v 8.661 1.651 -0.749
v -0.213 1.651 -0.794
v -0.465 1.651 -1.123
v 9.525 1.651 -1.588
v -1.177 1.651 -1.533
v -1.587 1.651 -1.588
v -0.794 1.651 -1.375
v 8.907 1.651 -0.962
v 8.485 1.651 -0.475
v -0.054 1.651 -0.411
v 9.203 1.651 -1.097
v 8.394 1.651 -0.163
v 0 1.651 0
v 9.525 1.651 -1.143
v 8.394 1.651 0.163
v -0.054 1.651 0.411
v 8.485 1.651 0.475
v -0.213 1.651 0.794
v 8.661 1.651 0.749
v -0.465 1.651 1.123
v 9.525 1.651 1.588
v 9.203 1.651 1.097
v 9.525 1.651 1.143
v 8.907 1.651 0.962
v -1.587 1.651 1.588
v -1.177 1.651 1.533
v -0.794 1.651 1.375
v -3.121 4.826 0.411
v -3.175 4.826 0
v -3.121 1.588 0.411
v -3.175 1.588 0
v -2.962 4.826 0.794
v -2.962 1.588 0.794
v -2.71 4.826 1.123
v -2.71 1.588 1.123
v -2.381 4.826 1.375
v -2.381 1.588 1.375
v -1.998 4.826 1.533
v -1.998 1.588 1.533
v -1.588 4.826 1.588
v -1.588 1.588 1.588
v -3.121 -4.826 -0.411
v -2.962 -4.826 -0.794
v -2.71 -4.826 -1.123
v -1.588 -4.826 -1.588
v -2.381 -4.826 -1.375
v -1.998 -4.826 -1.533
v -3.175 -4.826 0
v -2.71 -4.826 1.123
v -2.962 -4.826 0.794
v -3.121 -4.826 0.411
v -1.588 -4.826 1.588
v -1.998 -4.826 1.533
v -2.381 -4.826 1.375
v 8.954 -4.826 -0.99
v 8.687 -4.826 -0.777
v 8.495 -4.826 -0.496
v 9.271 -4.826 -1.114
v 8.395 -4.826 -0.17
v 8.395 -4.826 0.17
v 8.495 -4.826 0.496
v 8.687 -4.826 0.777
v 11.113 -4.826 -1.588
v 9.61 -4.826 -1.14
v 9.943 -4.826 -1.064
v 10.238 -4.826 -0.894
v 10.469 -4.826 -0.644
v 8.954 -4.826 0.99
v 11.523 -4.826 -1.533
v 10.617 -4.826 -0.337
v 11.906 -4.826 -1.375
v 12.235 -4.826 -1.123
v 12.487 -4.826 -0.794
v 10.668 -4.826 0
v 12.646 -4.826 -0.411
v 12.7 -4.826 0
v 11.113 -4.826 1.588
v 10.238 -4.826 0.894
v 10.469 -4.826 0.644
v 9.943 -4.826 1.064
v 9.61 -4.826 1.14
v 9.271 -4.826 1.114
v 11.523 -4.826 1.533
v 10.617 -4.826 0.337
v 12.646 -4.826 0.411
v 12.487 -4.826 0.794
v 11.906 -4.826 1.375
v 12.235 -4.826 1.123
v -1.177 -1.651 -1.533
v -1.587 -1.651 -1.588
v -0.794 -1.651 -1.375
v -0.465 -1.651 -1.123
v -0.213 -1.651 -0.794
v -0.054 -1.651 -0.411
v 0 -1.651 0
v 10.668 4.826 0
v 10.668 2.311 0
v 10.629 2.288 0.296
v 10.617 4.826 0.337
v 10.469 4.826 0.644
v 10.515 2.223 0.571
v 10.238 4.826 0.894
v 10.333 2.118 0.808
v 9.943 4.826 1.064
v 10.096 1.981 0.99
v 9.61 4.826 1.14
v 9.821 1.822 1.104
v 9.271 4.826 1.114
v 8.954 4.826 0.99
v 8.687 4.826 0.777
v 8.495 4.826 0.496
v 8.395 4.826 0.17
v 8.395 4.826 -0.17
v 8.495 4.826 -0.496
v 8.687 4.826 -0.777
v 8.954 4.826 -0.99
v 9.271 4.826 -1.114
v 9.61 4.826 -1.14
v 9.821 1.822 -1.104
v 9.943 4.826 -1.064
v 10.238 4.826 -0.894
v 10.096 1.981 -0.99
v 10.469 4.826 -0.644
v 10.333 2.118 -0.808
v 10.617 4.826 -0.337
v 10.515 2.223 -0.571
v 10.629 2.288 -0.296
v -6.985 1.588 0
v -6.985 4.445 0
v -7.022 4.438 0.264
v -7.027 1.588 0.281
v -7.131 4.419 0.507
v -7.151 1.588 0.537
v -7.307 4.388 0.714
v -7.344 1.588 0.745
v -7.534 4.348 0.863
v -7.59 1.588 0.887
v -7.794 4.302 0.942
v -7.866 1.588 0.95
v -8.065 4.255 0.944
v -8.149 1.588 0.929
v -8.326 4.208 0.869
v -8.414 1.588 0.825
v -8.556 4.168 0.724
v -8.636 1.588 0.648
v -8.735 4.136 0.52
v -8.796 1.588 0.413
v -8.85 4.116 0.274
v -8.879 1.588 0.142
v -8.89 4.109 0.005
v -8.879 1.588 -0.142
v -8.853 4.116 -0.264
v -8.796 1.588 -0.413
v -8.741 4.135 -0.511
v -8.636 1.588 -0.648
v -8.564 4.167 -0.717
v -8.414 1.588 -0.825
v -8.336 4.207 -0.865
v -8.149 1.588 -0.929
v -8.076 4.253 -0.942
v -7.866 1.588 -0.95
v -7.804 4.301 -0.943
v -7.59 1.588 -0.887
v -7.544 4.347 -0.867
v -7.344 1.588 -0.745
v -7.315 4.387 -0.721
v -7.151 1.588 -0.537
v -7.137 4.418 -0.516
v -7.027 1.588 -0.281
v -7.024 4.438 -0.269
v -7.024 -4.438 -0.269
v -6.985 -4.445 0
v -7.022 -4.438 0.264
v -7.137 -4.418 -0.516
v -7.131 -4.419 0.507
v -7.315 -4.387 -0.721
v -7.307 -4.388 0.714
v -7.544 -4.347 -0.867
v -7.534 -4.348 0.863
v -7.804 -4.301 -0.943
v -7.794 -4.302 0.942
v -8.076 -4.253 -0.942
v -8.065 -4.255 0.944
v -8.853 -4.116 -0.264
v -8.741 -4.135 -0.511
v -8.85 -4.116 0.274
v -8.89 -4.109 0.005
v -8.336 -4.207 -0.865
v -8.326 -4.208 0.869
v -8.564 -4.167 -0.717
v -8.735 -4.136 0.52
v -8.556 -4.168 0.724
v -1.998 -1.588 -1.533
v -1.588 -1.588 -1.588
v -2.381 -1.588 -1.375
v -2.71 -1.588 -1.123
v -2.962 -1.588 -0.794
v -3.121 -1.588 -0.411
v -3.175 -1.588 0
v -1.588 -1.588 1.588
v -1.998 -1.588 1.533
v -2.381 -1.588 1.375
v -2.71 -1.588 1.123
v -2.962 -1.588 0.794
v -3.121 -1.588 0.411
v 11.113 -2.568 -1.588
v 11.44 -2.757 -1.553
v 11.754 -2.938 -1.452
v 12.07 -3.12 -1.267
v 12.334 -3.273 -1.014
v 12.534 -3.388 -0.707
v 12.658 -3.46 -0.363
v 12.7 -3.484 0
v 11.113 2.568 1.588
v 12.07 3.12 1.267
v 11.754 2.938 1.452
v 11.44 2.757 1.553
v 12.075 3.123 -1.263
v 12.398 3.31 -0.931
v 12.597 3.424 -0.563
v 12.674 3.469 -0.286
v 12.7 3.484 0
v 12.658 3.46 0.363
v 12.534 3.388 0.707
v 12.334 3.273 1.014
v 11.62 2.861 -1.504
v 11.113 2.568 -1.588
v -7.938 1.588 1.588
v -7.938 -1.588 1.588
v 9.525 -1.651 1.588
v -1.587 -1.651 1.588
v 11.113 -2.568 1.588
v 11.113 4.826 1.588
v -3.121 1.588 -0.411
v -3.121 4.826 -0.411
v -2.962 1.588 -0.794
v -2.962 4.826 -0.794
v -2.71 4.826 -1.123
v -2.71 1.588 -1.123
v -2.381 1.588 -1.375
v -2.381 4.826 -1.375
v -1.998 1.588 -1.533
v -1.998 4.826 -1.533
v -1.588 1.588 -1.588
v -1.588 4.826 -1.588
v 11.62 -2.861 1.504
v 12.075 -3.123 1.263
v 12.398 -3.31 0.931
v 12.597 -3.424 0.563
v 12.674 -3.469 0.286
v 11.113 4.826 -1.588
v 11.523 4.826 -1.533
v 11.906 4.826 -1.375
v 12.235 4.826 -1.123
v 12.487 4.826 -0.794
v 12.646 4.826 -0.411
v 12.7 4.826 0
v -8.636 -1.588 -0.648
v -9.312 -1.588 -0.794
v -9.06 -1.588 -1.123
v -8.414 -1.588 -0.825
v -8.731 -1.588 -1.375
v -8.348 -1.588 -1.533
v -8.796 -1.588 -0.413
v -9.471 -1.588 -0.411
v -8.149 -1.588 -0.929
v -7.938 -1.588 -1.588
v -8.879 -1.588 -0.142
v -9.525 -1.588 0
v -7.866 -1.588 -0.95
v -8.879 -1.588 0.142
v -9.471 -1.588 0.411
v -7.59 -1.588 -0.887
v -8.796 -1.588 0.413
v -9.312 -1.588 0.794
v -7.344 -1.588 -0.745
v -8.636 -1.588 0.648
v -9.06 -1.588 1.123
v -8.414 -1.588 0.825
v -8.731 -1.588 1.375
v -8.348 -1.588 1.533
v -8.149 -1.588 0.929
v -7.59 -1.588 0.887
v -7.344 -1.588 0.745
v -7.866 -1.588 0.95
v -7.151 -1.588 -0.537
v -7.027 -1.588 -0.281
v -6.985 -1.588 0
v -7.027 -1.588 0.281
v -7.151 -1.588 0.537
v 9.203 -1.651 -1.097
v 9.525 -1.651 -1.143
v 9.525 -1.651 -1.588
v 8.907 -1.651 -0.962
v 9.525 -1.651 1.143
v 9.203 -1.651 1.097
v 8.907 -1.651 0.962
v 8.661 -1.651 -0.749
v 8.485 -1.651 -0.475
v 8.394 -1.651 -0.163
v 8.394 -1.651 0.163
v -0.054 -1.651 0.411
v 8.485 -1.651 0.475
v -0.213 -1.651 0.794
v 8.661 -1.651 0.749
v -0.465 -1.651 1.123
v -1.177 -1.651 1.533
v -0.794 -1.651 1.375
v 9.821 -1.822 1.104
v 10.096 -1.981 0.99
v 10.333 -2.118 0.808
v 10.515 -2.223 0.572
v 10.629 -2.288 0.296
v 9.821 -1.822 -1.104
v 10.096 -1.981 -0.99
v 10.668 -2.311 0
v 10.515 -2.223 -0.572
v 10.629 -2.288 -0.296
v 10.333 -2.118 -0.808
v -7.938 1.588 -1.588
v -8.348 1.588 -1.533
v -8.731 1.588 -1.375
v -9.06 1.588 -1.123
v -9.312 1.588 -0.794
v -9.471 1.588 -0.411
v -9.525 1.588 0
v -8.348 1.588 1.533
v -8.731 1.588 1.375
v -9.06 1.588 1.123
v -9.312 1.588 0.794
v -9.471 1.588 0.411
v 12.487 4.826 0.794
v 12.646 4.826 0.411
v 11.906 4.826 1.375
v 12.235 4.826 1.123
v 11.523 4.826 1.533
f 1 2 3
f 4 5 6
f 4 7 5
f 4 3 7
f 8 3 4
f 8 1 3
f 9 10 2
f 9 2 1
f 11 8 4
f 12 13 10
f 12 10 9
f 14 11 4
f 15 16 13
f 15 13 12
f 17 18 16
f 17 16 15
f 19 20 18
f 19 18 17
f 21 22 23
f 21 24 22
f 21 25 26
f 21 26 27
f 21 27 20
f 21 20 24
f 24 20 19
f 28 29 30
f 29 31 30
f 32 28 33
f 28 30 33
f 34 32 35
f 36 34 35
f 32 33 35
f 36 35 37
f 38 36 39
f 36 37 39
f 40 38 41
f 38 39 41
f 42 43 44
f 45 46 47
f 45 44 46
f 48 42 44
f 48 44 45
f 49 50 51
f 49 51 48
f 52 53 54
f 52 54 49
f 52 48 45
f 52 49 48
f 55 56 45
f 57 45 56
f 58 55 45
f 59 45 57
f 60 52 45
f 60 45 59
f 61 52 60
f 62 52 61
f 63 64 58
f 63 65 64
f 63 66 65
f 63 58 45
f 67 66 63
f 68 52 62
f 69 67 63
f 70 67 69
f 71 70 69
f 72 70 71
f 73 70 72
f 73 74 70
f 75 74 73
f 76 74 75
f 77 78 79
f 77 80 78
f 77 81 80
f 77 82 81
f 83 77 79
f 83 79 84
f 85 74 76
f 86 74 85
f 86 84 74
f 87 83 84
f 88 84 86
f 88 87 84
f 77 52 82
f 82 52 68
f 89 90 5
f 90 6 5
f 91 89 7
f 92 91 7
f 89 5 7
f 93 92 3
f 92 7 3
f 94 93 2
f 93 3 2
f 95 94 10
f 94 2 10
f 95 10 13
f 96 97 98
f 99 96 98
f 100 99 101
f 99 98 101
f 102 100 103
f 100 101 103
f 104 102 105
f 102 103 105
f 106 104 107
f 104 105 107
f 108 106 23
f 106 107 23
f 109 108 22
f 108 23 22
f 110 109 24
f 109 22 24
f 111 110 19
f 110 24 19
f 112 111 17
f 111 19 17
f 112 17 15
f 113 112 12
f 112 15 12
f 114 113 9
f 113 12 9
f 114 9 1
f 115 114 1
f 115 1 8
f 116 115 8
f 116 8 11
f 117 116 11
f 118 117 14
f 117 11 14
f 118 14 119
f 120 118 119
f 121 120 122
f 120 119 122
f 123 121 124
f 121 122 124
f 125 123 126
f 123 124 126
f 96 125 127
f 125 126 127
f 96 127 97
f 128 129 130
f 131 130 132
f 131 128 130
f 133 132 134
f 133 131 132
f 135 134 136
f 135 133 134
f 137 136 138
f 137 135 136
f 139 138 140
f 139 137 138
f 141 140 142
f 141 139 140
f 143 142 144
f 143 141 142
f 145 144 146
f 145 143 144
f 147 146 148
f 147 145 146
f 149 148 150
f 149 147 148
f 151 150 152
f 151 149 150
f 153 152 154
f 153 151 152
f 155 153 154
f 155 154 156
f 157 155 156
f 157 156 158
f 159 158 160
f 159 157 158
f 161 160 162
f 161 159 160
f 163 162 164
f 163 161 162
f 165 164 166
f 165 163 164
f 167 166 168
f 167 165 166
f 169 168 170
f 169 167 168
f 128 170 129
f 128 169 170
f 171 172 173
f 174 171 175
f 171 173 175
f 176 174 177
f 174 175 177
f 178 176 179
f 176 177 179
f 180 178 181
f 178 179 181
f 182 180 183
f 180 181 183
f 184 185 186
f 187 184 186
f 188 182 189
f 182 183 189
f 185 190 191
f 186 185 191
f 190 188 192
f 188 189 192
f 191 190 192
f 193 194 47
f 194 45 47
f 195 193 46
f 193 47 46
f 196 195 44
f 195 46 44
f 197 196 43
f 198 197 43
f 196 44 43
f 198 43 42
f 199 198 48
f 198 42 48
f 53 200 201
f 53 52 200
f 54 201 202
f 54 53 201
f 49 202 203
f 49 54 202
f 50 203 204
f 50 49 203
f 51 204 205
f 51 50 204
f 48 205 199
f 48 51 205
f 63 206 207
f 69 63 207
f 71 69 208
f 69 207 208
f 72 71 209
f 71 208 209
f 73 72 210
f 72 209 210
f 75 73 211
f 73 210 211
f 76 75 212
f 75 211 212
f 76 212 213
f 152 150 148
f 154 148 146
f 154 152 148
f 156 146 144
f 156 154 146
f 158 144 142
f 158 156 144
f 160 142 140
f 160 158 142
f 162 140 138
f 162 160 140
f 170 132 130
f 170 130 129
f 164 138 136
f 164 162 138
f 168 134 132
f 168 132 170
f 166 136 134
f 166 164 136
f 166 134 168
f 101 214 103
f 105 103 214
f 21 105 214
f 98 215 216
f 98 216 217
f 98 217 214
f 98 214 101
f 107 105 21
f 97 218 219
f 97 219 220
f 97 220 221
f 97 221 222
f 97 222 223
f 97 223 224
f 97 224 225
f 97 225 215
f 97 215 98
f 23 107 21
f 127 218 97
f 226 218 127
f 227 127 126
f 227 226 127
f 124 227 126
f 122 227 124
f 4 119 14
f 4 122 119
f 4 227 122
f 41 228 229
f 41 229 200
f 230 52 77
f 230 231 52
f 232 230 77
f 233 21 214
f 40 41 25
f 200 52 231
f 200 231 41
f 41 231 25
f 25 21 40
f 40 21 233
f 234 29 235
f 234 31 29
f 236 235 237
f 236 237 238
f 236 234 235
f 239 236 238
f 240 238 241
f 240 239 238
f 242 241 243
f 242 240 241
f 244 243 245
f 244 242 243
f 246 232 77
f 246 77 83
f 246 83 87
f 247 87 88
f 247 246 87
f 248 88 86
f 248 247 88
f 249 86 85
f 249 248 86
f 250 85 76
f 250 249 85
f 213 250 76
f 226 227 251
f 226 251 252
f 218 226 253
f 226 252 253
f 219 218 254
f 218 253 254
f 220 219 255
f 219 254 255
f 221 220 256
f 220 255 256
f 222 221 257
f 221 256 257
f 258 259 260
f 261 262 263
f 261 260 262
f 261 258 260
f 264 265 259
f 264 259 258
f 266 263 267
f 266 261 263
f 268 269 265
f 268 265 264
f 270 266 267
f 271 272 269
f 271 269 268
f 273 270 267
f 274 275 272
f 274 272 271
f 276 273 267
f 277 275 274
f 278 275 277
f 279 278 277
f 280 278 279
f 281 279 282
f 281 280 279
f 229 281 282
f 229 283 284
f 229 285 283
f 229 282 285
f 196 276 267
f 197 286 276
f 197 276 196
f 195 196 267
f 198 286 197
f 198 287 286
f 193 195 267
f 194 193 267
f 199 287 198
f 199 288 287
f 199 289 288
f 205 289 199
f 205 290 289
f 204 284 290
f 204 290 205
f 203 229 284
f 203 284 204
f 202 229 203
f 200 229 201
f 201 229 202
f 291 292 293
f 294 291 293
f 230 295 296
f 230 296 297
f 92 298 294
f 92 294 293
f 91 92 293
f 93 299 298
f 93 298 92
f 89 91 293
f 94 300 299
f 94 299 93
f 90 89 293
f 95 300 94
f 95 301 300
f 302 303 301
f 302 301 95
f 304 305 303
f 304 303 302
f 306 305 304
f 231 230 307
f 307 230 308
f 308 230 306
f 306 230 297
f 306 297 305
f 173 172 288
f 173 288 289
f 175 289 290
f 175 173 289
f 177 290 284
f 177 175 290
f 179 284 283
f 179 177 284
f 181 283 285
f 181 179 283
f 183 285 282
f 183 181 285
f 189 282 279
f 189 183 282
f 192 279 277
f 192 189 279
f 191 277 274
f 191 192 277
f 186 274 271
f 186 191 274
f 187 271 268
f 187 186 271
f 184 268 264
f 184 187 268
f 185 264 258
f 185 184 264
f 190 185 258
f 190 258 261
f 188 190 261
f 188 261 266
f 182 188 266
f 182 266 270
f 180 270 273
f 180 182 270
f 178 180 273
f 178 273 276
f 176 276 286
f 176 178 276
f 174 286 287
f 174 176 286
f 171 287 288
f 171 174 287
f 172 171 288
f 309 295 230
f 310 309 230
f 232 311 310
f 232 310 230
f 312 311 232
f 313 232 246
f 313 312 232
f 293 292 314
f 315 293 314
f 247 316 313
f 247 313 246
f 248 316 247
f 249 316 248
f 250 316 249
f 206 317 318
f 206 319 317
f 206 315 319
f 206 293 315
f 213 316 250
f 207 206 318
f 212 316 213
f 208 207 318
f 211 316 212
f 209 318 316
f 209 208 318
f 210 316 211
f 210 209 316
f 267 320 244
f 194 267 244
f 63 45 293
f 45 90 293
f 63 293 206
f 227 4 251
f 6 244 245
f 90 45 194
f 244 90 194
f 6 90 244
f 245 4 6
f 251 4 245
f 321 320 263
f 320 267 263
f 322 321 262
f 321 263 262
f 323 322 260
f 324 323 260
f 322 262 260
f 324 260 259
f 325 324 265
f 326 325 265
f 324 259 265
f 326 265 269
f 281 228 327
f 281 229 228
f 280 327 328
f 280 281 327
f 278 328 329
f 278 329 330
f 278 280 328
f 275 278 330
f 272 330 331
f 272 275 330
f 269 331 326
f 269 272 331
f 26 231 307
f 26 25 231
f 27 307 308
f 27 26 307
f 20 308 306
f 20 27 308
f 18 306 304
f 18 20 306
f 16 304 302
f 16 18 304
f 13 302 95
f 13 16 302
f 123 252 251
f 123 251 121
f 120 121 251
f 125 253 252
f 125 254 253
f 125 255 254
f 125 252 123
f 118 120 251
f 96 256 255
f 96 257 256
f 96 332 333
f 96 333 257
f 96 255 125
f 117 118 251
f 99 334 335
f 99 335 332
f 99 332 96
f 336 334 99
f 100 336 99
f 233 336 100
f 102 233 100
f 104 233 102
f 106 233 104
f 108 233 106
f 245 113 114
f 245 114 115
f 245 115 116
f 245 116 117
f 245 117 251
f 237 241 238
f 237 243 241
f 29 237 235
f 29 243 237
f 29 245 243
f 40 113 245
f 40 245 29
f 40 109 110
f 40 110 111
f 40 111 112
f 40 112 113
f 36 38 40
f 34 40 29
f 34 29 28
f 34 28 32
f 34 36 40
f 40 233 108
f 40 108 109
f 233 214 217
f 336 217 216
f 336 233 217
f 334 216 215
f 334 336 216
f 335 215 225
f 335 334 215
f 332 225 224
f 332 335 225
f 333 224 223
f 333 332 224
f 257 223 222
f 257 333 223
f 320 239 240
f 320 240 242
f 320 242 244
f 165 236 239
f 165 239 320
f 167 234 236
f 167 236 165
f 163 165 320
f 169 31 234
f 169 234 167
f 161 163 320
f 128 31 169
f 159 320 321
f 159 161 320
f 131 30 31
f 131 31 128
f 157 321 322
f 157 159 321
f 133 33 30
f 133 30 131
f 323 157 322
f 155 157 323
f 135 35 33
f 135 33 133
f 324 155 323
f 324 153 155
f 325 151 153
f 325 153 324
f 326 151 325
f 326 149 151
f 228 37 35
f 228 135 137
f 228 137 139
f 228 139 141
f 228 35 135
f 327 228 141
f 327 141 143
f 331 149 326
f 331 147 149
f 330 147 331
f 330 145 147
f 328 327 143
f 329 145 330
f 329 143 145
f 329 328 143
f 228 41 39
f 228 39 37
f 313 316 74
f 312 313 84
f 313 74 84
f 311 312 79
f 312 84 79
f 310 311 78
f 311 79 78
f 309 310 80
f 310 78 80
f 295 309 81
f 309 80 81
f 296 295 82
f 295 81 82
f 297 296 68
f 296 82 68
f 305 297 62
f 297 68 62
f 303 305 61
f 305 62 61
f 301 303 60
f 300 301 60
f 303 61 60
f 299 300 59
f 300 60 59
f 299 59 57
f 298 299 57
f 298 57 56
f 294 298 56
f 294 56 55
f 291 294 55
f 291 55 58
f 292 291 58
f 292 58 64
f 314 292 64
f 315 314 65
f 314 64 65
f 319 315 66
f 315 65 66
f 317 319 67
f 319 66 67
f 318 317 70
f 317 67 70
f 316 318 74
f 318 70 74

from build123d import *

# Parameters (mm, degrees)
F1_DEPTH = 1.5875
F3_DEPTH = 4.445
F4_R     = 1.58749
F5_R     = 1.143
F6_DEPTH = 12.7
F8_DEPTH = 12.7


# Not quite as in the source:
# - a fillet or chamfer is up to 0.001 mm smaller than in the source, because OpenCascade refuses the exact size


with BuildPart() as f1:
    # F0 (on Top) → F1 (new body, symmetric)
    with BuildSketch(Plane.XY):
        Polygon((12.7, 1.651), (12.7, 4.826), (-3.175, 4.826), (-3.175, 1.5875), (-9.525, 1.5875), (-9.525, -1.5875), (-3.175, -1.5875), (-3.175, -4.826), (12.7, -4.826), (12.7, -1.651), (0, -1.651), (0, 0), (0, 1.651), align=None)
    extrude(amount=F1_DEPTH, both=True)

    # F2 (on Front) → F3 (join, symmetric)
    with BuildSketch(Plane.XZ):
        with BuildLine():
            ThreePointArc((-8.89, 0), (-7.9375, -0.9525), (-6.985, 0))
            ThreePointArc((-6.985, 0), (-7.9375, 0.9525), (-8.89, 0))
        make_face()
    extrude(amount=F3_DEPTH, both=True)

    # F4 (radius 1.5875 in the source; OpenCascade refuses exactly that, so slightly less here)
    f4_edges = [f1.edges().sort_by_distance(p)[0] for p in [
        (-3.175, 3.20675, -1.5875),
        (-3.175, 3.20675, 1.5875),
        (-3.175, -3.20675, 1.5875),
        (-3.175, -3.20675, -1.5875),
        (-9.525, 0, 1.5875),
        (-9.525, 0, -1.5875),
        (12.7, 3.2385, -1.5875),
        (12.7, 3.2385, 1.5875),
        (12.7, -3.2385, 1.5875),
        (12.7, -3.2385, -1.5875),
        (0, 0, 1.5875),
        (0, 0, -1.5875),
    ]]
    fillet(f4_edges, radius=F4_R)

    # F5 (on Front) → F6 (cut, symmetric)
    with BuildSketch(Plane.XZ):
        with Locations((9.525, 0)):
            Circle(F5_R)
    extrude(amount=F6_DEPTH, both=True, mode=Mode.SUBTRACT)

    # F7 (on Top) → F8 (cut, symmetric)
    with BuildSketch(Plane.XY):
        Polygon((9.525, 1.651), (9.525, -1.651), (15.875, -5.3171742094), (15.875, 5.3171742094), align=None)
        Polygon((-9.525, 4.445), (-9.525, 3.997129469), (-6.985, 4.445), align=None)
        Polygon((-9.525, -4.445), (-6.985, -4.445), (-9.525, -3.997129469), align=None)
    extrude(amount=F8_DEPTH, both=True, mode=Mode.SUBTRACT)


solid = f1.part
